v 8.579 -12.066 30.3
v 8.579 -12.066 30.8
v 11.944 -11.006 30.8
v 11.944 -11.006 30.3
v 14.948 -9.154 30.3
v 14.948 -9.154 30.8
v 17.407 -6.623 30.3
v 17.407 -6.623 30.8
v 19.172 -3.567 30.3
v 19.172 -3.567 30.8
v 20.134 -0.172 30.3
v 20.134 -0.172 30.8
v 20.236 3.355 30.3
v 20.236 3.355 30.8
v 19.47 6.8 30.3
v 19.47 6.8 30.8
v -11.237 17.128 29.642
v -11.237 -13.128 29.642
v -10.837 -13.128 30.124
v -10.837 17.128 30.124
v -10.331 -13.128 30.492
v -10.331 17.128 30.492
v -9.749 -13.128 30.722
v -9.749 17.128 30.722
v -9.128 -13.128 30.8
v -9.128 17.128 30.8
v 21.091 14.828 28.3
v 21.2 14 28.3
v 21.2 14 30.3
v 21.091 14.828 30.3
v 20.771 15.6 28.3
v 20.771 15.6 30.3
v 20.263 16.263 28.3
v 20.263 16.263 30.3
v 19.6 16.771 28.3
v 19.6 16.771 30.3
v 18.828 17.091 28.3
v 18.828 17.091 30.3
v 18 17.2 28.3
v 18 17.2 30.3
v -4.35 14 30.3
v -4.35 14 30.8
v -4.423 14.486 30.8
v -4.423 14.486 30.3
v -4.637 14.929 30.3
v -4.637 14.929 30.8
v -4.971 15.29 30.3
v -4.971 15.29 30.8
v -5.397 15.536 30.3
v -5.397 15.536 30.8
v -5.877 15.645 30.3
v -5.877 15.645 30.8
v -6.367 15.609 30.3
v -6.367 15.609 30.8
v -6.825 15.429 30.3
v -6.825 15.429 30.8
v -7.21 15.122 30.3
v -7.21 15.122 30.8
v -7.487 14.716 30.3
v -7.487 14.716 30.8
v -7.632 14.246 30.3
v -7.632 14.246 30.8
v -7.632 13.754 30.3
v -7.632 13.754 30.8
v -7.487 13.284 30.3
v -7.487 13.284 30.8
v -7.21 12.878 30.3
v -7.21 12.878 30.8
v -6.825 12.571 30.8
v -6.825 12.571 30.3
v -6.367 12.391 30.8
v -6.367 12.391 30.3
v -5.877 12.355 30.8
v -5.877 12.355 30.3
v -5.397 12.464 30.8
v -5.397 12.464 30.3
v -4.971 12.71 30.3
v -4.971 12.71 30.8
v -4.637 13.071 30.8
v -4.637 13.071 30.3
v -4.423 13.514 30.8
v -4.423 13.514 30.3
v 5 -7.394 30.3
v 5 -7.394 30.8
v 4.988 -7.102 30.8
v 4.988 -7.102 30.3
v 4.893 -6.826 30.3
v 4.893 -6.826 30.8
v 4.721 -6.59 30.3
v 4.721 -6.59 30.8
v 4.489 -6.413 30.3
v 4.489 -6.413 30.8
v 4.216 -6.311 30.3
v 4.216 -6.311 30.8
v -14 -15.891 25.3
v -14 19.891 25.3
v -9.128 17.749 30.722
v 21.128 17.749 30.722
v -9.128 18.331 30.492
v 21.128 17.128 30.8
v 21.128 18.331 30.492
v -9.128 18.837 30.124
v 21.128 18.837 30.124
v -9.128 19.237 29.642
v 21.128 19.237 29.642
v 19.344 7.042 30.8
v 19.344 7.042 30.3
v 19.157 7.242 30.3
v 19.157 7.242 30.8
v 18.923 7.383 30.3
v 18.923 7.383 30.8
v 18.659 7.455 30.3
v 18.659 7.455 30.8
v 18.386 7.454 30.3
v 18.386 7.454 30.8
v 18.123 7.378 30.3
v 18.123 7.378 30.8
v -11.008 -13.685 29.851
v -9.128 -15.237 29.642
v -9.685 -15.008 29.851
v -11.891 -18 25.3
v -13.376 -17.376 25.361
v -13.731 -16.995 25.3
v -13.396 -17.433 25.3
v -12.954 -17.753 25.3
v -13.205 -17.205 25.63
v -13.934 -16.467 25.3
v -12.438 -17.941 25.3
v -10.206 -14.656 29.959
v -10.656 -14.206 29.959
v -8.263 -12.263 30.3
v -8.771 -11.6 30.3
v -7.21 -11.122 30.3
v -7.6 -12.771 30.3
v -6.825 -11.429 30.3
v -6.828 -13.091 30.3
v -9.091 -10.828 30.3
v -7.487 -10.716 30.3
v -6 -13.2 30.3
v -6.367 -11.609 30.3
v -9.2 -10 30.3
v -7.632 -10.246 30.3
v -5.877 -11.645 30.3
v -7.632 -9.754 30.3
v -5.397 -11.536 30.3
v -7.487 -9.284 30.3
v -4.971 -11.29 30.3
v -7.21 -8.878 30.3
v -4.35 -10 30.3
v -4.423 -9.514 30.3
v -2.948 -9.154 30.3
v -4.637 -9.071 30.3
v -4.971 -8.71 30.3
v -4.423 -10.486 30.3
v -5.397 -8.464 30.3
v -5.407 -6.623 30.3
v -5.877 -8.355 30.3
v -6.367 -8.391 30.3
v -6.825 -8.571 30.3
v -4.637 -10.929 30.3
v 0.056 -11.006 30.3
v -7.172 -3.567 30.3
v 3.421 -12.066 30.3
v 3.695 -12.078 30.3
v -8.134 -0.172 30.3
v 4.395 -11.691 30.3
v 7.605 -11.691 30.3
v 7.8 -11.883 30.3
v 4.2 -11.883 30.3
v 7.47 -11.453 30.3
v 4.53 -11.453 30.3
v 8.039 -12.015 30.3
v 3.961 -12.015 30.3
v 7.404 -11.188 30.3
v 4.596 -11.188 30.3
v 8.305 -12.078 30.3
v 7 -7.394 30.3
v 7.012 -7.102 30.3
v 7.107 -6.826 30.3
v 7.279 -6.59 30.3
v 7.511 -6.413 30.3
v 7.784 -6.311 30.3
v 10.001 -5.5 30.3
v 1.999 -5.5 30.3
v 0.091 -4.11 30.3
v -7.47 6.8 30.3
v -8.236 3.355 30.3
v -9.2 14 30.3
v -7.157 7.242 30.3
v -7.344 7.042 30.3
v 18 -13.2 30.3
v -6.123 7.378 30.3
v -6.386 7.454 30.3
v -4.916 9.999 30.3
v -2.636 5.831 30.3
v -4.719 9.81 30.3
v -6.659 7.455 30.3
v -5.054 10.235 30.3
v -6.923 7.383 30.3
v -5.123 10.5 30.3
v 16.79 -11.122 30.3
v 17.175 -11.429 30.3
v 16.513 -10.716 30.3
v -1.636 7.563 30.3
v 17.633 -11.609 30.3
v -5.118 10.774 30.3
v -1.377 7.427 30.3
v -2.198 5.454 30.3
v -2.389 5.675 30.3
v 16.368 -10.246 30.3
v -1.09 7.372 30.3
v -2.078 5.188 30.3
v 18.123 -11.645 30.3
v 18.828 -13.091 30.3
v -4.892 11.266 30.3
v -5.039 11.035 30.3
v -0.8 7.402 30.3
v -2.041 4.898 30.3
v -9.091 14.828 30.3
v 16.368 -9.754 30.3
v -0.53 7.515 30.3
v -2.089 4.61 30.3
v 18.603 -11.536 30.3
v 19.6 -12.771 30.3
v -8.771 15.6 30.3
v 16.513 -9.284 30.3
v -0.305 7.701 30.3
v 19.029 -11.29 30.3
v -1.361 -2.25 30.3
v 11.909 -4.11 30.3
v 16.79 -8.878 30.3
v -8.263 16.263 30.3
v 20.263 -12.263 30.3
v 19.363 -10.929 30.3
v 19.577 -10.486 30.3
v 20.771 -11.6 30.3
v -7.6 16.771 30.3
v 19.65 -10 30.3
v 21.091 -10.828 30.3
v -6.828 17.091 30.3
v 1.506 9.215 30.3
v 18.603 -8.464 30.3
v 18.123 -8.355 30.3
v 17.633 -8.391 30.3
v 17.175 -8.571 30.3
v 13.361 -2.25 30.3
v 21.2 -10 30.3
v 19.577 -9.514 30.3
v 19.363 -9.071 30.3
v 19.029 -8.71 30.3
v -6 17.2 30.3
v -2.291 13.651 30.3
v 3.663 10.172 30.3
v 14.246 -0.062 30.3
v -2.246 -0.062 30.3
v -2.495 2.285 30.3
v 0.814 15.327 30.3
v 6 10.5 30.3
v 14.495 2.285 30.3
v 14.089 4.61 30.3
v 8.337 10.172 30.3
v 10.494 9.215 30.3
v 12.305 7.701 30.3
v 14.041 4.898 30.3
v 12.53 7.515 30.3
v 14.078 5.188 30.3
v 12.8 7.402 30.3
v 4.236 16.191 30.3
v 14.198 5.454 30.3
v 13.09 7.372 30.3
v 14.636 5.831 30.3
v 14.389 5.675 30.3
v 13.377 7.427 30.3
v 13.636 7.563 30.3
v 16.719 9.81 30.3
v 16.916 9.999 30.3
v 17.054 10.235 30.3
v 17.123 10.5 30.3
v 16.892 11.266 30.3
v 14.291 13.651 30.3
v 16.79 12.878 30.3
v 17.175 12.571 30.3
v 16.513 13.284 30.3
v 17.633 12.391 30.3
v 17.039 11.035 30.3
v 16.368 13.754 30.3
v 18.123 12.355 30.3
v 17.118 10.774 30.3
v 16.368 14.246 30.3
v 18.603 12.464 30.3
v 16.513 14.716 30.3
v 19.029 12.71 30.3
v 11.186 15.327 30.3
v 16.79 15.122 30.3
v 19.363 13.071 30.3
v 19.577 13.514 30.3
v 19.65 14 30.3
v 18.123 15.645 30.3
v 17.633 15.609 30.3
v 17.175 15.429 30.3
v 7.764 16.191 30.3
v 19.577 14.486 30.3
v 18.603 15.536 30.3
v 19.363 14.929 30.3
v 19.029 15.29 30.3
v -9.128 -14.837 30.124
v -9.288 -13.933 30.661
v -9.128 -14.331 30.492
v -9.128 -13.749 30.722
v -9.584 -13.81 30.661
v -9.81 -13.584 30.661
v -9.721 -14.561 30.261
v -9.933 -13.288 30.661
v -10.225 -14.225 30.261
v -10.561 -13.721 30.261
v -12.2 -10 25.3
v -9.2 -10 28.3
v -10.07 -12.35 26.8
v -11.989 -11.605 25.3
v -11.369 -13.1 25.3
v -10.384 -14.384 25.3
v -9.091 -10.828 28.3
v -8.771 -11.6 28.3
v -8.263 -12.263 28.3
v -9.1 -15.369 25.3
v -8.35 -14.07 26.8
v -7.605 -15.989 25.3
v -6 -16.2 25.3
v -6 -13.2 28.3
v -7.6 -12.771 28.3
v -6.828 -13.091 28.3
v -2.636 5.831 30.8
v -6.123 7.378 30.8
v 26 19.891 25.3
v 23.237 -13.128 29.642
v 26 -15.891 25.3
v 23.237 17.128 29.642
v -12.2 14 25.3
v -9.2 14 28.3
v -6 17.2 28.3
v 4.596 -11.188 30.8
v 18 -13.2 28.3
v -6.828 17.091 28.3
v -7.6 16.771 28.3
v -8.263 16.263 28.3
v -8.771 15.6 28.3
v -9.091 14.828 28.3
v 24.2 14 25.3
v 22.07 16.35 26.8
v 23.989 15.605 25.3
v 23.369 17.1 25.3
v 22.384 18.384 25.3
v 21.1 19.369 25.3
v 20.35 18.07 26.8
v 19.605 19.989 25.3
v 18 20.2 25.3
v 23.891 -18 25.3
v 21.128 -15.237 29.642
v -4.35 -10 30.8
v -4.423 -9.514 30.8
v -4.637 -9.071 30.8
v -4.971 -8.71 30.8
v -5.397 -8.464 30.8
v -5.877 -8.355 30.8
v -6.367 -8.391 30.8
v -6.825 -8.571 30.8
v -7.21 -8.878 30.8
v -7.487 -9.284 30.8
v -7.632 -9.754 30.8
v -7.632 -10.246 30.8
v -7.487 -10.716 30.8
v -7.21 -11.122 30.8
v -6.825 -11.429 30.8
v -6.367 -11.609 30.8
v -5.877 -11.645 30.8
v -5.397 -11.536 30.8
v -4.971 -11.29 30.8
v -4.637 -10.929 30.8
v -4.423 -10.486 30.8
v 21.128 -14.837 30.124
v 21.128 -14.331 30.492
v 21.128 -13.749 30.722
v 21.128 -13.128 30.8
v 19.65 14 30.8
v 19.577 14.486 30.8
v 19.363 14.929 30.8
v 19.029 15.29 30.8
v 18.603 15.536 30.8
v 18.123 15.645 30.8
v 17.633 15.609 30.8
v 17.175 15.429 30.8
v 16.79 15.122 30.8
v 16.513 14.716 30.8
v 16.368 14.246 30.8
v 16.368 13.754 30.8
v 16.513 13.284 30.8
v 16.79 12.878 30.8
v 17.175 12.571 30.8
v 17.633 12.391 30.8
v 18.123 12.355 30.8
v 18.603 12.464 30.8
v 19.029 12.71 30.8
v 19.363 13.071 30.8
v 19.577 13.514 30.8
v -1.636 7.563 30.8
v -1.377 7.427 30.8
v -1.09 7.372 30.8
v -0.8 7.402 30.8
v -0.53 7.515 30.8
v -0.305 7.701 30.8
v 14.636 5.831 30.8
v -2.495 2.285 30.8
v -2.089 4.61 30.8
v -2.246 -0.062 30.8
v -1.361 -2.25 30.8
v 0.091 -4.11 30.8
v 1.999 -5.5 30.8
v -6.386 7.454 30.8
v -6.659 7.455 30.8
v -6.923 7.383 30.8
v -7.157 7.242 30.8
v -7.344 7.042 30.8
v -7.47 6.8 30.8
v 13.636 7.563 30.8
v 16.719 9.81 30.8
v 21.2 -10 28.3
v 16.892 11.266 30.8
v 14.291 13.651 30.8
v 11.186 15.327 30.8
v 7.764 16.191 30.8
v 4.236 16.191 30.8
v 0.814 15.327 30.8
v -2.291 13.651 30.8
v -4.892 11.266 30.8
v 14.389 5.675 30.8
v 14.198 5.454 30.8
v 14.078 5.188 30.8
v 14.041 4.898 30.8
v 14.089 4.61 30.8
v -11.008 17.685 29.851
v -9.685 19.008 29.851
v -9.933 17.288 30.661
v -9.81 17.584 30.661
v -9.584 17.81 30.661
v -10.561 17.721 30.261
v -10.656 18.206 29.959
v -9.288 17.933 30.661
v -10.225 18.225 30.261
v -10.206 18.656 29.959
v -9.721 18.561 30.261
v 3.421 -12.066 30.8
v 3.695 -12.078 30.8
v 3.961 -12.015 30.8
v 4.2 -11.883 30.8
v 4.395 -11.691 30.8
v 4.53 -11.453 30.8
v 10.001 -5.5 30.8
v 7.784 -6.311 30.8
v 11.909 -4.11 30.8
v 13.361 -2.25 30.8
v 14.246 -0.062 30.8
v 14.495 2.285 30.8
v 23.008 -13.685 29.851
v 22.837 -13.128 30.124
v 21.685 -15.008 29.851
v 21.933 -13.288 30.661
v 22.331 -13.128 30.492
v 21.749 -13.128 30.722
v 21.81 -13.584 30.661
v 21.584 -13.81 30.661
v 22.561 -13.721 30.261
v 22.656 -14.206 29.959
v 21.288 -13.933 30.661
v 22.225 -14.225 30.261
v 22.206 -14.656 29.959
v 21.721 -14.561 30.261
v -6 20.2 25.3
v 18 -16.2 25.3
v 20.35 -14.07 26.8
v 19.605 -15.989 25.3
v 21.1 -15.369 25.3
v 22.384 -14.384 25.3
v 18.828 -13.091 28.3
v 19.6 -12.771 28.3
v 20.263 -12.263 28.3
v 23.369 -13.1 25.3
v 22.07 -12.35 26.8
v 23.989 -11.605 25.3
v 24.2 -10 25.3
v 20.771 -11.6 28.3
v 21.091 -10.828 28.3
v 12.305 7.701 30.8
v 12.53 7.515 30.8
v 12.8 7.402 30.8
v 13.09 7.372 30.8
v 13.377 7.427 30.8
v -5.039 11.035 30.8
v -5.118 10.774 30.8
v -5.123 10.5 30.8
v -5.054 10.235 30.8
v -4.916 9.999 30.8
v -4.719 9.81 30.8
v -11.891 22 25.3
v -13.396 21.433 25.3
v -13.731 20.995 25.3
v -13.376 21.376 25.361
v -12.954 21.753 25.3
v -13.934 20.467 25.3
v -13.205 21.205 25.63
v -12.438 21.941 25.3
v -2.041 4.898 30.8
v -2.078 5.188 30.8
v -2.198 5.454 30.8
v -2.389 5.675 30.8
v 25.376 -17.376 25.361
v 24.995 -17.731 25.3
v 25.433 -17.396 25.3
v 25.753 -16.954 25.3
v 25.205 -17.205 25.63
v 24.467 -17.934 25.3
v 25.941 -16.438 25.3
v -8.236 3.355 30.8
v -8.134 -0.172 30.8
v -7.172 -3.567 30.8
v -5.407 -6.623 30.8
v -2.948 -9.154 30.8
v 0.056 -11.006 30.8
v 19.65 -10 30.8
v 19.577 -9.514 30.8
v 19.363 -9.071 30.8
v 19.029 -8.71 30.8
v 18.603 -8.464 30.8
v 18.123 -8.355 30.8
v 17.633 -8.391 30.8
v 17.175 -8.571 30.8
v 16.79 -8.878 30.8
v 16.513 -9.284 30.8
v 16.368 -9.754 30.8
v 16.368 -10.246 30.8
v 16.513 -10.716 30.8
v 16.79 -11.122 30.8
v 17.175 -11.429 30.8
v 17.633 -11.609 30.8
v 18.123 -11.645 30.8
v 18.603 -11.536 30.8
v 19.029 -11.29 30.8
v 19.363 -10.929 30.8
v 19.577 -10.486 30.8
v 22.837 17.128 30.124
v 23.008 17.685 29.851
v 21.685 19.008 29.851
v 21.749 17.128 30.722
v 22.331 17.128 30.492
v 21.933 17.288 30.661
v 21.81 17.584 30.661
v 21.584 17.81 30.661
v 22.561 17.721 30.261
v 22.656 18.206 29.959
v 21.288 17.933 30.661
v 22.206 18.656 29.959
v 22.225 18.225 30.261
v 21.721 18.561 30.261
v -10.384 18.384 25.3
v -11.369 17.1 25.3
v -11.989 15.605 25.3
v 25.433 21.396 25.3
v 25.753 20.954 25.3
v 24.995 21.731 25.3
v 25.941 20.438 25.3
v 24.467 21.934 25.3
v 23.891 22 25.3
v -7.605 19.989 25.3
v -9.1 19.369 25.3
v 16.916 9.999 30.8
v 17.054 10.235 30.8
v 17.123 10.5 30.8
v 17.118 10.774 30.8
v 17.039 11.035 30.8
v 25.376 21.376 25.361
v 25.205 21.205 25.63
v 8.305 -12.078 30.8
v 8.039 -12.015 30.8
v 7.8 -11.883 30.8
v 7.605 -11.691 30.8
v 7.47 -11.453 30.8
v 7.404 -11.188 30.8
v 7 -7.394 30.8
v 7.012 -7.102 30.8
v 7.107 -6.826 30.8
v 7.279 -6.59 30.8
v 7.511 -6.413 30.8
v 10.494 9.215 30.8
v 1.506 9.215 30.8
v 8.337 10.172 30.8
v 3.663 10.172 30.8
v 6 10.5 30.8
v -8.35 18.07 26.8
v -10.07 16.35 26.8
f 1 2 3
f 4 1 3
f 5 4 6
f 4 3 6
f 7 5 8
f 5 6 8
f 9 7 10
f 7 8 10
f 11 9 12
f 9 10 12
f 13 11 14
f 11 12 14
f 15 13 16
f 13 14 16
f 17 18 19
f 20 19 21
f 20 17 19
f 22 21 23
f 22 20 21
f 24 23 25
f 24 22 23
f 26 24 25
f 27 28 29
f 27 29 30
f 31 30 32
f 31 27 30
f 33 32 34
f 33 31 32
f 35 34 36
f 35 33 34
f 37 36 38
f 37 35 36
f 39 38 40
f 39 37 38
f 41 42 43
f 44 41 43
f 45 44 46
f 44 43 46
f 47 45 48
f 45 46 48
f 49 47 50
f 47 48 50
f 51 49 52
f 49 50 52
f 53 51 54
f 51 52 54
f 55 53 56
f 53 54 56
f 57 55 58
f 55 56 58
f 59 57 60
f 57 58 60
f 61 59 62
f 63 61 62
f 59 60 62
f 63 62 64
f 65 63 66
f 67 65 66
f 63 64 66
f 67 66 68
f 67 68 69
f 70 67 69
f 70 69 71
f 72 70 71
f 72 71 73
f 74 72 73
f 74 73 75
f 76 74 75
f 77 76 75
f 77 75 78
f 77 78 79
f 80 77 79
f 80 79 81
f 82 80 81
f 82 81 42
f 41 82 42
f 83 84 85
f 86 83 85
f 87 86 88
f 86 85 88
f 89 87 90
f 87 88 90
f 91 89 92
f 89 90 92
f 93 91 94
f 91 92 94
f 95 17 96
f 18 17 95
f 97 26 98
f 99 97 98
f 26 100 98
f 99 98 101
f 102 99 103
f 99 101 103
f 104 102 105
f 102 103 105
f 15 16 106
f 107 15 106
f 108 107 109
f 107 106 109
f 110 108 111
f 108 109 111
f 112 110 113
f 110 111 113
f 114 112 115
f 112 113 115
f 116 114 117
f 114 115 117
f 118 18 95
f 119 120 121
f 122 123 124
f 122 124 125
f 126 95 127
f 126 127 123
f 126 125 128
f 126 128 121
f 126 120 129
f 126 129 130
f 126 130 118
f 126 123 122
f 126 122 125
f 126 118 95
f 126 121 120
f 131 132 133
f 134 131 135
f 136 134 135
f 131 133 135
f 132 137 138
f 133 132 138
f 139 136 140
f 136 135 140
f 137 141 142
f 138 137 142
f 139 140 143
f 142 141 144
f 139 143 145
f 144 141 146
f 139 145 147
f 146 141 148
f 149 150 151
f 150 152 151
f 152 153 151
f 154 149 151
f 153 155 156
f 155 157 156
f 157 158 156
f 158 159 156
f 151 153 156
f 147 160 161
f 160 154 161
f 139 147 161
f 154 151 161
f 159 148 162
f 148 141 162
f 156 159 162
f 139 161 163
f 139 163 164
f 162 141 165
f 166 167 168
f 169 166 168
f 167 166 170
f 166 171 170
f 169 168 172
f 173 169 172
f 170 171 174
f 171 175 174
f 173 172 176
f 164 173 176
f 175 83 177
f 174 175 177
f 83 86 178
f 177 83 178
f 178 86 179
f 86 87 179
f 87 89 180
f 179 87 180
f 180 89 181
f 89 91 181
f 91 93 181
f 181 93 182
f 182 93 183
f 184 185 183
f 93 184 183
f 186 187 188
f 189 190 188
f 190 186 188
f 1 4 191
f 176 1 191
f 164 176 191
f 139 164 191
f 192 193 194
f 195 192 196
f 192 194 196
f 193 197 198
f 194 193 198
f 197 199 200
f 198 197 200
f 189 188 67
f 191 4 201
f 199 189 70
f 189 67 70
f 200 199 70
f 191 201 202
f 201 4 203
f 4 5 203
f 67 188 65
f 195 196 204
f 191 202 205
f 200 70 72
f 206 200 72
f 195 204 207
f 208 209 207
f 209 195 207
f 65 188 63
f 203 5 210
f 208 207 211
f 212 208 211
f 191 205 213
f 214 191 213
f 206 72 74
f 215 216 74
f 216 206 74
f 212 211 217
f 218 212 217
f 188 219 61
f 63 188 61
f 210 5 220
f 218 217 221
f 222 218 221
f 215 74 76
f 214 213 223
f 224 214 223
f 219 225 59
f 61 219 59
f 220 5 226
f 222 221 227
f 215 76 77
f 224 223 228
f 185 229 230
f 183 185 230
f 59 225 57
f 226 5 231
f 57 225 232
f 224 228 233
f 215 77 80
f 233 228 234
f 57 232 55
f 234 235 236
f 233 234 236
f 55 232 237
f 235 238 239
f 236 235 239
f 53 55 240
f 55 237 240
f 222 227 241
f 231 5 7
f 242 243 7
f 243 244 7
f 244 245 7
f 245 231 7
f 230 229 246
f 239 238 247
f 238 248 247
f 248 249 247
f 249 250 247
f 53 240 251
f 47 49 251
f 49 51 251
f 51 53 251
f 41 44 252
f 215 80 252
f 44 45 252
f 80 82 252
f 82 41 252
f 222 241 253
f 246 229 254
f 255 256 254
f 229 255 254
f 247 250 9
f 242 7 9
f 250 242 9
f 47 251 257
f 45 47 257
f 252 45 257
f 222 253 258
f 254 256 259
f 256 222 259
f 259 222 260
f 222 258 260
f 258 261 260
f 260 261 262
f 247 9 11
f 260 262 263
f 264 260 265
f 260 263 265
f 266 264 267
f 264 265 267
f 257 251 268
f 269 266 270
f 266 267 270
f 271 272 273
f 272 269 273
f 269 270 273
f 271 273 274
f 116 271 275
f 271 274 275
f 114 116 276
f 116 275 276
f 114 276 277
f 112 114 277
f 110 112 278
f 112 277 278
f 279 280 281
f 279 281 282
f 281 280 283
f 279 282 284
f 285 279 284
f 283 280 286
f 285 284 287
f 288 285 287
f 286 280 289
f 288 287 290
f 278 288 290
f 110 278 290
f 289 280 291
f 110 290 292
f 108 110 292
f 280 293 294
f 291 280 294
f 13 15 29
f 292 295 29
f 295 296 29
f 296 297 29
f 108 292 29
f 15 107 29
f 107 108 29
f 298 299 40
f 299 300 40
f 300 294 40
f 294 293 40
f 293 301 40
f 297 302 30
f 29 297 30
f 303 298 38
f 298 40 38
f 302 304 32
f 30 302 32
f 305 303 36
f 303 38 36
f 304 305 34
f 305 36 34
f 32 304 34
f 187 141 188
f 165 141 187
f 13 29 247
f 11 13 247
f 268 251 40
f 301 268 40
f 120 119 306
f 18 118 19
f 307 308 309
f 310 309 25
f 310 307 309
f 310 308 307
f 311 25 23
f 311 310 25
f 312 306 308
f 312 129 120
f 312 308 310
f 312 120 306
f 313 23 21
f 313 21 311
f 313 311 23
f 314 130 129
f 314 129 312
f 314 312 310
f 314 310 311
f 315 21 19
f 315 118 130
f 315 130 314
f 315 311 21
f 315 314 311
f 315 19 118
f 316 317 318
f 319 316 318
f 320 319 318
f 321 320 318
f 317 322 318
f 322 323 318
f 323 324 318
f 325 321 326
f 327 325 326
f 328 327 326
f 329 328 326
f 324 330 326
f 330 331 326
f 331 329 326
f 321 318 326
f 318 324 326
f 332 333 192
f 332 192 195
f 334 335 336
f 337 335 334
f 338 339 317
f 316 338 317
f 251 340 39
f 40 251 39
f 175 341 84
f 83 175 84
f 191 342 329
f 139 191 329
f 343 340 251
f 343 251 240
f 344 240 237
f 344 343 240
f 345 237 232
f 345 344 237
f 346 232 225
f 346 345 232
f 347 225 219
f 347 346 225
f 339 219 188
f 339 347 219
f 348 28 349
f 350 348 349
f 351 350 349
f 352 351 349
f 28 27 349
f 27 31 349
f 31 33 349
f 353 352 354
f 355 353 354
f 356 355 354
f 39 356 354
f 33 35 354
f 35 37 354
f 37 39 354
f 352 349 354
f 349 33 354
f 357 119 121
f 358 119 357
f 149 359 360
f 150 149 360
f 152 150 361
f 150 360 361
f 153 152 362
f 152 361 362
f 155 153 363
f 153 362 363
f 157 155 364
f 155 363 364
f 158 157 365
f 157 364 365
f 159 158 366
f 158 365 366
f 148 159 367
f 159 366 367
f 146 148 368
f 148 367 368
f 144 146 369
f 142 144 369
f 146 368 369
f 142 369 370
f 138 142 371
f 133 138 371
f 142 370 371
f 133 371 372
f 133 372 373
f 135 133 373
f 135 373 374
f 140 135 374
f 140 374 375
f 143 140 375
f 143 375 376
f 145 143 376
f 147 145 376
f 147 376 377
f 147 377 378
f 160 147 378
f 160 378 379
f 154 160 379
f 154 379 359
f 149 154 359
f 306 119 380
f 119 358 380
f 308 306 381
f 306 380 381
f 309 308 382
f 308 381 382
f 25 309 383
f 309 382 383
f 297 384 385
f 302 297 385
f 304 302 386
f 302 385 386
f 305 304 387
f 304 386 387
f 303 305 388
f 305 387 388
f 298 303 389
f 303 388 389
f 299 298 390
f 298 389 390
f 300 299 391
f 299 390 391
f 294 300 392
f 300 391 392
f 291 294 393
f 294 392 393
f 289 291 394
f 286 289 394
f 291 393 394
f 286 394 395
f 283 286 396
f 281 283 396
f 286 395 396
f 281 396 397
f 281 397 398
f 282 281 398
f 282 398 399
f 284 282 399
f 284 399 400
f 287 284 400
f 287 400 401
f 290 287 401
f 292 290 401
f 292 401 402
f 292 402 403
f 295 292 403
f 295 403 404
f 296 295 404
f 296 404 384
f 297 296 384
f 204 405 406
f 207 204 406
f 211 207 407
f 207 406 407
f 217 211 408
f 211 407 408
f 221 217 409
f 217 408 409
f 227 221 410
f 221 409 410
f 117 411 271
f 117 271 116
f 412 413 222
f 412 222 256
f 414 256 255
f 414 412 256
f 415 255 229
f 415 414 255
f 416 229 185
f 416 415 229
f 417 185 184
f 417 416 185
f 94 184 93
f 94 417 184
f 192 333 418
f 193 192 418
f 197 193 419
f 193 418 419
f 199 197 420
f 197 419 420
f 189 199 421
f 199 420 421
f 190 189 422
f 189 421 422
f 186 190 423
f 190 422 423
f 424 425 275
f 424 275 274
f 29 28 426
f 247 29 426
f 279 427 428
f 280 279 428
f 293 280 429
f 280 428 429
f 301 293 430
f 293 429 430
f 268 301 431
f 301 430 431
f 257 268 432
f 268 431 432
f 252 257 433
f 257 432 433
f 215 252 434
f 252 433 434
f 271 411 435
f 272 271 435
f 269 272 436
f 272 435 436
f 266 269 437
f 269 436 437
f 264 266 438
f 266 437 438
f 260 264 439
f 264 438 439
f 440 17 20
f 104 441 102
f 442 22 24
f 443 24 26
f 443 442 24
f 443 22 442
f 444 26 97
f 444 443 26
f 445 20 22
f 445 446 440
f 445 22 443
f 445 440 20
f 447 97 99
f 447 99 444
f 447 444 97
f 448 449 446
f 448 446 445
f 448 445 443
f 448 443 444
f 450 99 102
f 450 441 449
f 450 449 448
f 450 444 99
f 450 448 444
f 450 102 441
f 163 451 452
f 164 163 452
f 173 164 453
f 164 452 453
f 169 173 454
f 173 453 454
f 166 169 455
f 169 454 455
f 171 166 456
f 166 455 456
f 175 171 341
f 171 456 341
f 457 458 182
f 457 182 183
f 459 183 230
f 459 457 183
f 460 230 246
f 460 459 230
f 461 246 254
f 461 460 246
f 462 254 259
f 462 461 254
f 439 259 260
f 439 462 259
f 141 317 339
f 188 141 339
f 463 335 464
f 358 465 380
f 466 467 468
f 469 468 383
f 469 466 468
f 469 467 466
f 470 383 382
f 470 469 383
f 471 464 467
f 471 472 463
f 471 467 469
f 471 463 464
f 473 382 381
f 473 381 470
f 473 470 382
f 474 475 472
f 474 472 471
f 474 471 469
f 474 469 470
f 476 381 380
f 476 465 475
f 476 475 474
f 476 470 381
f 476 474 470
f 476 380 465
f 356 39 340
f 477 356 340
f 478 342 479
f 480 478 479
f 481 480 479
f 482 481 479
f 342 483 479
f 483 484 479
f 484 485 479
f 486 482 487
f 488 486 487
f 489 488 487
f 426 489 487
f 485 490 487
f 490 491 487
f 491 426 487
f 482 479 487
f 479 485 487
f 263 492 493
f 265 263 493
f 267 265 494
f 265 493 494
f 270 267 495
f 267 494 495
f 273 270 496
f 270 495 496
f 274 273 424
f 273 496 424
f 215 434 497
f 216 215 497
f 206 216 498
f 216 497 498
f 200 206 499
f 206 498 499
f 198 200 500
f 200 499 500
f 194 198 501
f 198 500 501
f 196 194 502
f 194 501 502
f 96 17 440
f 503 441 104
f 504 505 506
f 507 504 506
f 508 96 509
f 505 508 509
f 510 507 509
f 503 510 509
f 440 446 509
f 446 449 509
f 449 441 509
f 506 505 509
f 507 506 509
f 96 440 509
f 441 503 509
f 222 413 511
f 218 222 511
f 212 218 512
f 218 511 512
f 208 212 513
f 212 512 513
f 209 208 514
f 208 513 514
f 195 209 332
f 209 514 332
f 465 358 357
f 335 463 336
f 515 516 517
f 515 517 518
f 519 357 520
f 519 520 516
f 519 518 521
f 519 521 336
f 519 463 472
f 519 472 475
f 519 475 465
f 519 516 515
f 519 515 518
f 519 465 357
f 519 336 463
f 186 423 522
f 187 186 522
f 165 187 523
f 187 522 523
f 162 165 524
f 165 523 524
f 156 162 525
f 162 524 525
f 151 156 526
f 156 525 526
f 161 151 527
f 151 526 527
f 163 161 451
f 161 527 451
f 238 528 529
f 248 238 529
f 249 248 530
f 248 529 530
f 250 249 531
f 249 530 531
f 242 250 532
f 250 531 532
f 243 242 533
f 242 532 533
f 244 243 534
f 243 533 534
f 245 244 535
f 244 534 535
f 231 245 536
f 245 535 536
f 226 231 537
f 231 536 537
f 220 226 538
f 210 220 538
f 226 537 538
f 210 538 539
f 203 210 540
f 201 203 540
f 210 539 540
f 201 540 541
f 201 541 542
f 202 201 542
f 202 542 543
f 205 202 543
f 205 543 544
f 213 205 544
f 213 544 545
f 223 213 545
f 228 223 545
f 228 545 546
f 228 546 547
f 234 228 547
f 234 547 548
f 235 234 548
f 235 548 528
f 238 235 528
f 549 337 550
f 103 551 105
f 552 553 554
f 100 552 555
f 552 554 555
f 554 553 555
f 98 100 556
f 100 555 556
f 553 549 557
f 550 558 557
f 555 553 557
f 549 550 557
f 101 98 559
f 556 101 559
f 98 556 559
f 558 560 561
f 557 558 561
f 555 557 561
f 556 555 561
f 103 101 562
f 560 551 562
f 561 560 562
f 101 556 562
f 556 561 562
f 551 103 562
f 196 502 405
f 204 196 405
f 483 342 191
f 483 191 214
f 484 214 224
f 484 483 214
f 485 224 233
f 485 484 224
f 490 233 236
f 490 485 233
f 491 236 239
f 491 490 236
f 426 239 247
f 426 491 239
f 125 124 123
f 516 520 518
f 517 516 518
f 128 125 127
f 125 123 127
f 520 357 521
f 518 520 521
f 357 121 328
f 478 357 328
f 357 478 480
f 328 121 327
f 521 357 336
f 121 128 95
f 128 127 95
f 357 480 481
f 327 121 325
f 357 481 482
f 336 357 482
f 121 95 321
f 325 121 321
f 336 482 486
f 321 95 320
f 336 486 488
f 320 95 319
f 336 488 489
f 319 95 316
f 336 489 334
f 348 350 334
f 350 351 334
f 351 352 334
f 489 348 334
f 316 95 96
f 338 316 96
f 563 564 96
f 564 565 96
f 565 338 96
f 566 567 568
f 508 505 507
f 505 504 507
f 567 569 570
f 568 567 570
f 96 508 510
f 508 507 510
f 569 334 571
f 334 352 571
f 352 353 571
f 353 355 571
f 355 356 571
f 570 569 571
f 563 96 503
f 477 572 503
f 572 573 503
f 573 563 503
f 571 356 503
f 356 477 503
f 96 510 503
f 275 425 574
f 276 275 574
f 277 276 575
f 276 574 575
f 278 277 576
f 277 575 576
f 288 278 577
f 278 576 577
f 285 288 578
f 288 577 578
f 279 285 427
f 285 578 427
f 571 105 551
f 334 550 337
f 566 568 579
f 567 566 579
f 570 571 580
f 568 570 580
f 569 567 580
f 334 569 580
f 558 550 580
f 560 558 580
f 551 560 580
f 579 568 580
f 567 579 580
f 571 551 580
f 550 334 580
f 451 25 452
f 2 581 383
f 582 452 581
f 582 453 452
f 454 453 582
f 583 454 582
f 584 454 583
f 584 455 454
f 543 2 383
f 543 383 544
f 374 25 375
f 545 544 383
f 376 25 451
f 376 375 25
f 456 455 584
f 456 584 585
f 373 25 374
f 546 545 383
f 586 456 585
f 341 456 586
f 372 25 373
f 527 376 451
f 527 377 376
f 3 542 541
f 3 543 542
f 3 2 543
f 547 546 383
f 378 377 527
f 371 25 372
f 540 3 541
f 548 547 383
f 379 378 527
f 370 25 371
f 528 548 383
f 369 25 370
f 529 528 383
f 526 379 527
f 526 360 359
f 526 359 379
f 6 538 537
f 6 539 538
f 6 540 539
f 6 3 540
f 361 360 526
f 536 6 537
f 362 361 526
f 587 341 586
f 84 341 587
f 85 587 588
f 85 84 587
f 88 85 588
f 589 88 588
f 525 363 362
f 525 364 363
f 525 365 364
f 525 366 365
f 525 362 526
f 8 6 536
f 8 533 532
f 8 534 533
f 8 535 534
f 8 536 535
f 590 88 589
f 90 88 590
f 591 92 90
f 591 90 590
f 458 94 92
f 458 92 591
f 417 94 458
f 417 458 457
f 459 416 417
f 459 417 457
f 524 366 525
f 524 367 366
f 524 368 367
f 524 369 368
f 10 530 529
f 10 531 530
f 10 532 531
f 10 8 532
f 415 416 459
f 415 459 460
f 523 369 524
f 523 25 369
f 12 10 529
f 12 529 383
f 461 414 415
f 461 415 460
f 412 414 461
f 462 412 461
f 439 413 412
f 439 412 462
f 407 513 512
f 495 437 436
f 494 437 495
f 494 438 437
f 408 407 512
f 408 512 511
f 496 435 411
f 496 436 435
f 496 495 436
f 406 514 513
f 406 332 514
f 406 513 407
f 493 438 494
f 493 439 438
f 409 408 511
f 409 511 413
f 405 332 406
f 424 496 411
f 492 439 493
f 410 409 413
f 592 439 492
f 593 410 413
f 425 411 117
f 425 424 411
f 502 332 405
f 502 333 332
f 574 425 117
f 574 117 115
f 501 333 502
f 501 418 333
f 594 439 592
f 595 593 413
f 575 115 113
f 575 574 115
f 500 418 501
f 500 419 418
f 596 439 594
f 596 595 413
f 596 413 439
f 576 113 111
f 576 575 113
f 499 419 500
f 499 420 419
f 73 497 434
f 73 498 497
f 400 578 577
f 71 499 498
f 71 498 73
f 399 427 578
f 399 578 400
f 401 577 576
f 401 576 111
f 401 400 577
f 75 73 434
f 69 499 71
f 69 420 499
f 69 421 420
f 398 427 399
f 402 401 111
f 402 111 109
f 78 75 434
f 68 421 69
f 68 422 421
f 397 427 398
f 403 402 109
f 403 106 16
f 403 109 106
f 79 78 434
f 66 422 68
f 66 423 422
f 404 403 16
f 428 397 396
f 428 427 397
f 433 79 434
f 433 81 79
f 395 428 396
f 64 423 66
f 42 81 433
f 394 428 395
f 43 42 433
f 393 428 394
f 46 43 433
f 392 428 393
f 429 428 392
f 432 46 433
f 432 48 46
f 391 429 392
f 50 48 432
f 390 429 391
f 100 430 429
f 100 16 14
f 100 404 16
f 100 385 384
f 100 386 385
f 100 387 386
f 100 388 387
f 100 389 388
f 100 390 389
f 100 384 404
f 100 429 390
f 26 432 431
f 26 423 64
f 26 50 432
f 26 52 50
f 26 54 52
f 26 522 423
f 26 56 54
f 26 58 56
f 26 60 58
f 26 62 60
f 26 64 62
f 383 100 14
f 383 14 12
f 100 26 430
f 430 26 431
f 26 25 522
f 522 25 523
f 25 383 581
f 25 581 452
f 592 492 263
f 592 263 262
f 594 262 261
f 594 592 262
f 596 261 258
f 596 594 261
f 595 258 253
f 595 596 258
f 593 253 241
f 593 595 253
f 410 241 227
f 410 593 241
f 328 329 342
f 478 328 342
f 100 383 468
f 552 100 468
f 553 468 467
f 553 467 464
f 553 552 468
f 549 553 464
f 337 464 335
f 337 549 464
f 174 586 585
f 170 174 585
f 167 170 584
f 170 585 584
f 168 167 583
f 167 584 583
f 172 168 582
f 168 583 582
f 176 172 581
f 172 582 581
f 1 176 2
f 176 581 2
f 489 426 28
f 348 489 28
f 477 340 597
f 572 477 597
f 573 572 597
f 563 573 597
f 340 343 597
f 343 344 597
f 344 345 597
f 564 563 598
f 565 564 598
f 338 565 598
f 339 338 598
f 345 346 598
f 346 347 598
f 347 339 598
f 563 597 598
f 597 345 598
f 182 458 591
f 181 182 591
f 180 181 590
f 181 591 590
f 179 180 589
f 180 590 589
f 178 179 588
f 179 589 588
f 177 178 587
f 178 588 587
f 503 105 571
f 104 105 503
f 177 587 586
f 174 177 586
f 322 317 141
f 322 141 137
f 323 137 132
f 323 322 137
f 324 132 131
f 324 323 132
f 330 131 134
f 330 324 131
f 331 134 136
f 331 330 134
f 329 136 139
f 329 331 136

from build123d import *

# Parameters (mm, degrees)
SKETCH037_W     = 40
SKETCH037_H     = 40
SKETCH040_W     = 33
SKETCH040_H     = 33
POCKET025_DEPTH = 5
SKETCH039_R     = 1.65
POCKET026_DEPTH = 5
POCKET027_DEPTH = 5
FILLET001_R     = 2.5
CHAMFER011_SIZE = 3


with BuildPart() as part:
    # Sketch037 → AdditiveLoft section 0
    with BuildSketch(Plane.XY):
        Rectangle(SKETCH037_W, SKETCH037_H)
    # Sketch040 → AdditiveLoft section 1
    with BuildSketch(Plane.XY.offset(5.5)):
        Rectangle(SKETCH040_W, SKETCH040_H)
    loft()

    # Sketch038 → Pocket025 (cut)
    with BuildSketch(Plane.XY):
        with BuildLine():
            ThreePointArc((-12, 15.2), (-14.262742, 14.262742), (-15.2, 12))
            Line((-15.2, -12), (-15.2, 12))
            ThreePointArc((-15.2, -12), (-14.262742, -14.262742), (-12, -15.2))
            Line((12, -15.2), (-12, -15.2))
            ThreePointArc((12, -15.2), (14.262742, -14.262742), (15.2, -12))
            Line((15.2, 12), (15.2, -12))
            ThreePointArc((15.2, 12), (14.262742, 14.262742), (12, 15.2))
            Line((-12, 15.2), (12, 15.2))
        make_face()
    extrude(amount=POCKET025_DEPTH, mode=Mode.SUBTRACT)

    # Sketch039 → Pocket026 (cut)
    with BuildSketch(Plane.XY.offset(5.5)):
        with Locations((-12, 12)):
            Circle(SKETCH039_R)
        with Locations((12, 12)):
            Circle(SKETCH039_R)
        with Locations((12, -12)):
            Circle(SKETCH039_R)
        with Locations((-12, -12)):
            Circle(SKETCH039_R)
    extrude(amount=-POCKET026_DEPTH, mode=Mode.SUBTRACT)

    # Sketch041 → Pocket027 (cut)
    with BuildSketch(Plane.XY.offset(5.5)):
        with BuildLine():
            ThreePointArc((10.891901, 9.265878), (0, 14.3), (-10.891901, 9.265878))
            ThreePointArc((-10.891901, 9.265878), (-11.123261, 8.500069), (-10.71909, 7.80968))
            Line((-10.71909, 7.80968), (-7.63557, 5.563099))
            ThreePointArc((-7.63557, 5.563099), (-6.943871, 5.376635), (-6.30495, 5.700667))
            ThreePointArc((6.30495, 5.700667), (0, 8.5), (-6.30495, 5.700667))
            ThreePointArc((6.30495, 5.700667), (6.943871, 5.376635), (7.63557, 5.563099))
            Line((10.71909, 7.80968), (7.63557, 5.563099))
            ThreePointArc((10.71909, 7.80968), (11.123261, 8.500069), (10.891901, 9.265878))
        make_face()
        with BuildLine():
            ThreePointArc((-13.470436, 4.799724), (-12.384163, -7.15), (-2.578535, -14.065602))
            ThreePointArc((-2.578535, -14.065602), (-1.799645, -13.883061), (-1.403836, -13.187845))
            Line((-1.403836, -13.187845), (-1, -9.394147))
            ThreePointArc((-1, -9.394147), (-1.184367, -8.701886), (-1.784447, -8.310581))
            ThreePointArc((-8.089397, 2.609914), (-7.361216, -4.25), (-1.784447, -8.310581))
            ThreePointArc((-8.089397, 2.609914), (-8.128238, 3.325251), (-8.63557, 3.831048))
            Line((-12.122927, 5.378164), (-8.63557, 3.831048))
            ThreePointArc((-12.122927, 5.378164), (-12.922906, 5.382992), (-13.470436, 4.799724))
        make_face()
        with BuildLine():
            ThreePointArc((2.578535, -14.065602), (12.384163, -7.15), (13.470436, 4.799724))
            ThreePointArc((13.470436, 4.799724), (12.922906, 5.382992), (12.122927, 5.378164))
            Line((8.63557, 3.831048), (12.122927, 5.378164))
            ThreePointArc((8.63557, 3.831048), (8.128238, 3.325251), (8.089397, 2.609914))
            ThreePointArc((1.784447, -8.310581), (7.361216, -4.25), (8.089397, 2.609914))
            ThreePointArc((1.784447, -8.310581), (1.184367, -8.701886), (1, -9.394147))
            Line((1, -9.394147), (1.403836, -13.187845))
            ThreePointArc((1.403836, -13.187845), (1.799645, -13.883061), (2.578535, -14.065602))
        make_face()
    extrude(amount=-POCKET027_DEPTH, mode=Mode.SUBTRACT)

    # Fillet001
    fillet001_edges = [part.edges().sort_by_distance(p)[0] for p in [
        (18.25, -18.25, 2.75),
        (18.25, 18.25, 2.75),
        (-18.25, -18.25, 2.75),
        (-18.25, 18.25, 2.75),
        (16.5, 0, 5.5),
        (0, -16.5, 5.5),
        (-16.5, 0, 5.5),
        (0, 16.5, 5.5),
    ]]
    fillet(fillet001_edges, radius=FILLET001_R)

    # Chamfer011
    chamfer011_edges = [part.edges().sort_by_distance(p)[0] for p in [
        (14.262742, 14.262742, 0),
    ]]
    chamfer(chamfer011_edges, length=CHAMFER011_SIZE)


with BuildPart() as part_1:
    # Body002 placement: moved
    add(part.part.moved(Location((6, 2, 25.3))))


solid = part_1.part
